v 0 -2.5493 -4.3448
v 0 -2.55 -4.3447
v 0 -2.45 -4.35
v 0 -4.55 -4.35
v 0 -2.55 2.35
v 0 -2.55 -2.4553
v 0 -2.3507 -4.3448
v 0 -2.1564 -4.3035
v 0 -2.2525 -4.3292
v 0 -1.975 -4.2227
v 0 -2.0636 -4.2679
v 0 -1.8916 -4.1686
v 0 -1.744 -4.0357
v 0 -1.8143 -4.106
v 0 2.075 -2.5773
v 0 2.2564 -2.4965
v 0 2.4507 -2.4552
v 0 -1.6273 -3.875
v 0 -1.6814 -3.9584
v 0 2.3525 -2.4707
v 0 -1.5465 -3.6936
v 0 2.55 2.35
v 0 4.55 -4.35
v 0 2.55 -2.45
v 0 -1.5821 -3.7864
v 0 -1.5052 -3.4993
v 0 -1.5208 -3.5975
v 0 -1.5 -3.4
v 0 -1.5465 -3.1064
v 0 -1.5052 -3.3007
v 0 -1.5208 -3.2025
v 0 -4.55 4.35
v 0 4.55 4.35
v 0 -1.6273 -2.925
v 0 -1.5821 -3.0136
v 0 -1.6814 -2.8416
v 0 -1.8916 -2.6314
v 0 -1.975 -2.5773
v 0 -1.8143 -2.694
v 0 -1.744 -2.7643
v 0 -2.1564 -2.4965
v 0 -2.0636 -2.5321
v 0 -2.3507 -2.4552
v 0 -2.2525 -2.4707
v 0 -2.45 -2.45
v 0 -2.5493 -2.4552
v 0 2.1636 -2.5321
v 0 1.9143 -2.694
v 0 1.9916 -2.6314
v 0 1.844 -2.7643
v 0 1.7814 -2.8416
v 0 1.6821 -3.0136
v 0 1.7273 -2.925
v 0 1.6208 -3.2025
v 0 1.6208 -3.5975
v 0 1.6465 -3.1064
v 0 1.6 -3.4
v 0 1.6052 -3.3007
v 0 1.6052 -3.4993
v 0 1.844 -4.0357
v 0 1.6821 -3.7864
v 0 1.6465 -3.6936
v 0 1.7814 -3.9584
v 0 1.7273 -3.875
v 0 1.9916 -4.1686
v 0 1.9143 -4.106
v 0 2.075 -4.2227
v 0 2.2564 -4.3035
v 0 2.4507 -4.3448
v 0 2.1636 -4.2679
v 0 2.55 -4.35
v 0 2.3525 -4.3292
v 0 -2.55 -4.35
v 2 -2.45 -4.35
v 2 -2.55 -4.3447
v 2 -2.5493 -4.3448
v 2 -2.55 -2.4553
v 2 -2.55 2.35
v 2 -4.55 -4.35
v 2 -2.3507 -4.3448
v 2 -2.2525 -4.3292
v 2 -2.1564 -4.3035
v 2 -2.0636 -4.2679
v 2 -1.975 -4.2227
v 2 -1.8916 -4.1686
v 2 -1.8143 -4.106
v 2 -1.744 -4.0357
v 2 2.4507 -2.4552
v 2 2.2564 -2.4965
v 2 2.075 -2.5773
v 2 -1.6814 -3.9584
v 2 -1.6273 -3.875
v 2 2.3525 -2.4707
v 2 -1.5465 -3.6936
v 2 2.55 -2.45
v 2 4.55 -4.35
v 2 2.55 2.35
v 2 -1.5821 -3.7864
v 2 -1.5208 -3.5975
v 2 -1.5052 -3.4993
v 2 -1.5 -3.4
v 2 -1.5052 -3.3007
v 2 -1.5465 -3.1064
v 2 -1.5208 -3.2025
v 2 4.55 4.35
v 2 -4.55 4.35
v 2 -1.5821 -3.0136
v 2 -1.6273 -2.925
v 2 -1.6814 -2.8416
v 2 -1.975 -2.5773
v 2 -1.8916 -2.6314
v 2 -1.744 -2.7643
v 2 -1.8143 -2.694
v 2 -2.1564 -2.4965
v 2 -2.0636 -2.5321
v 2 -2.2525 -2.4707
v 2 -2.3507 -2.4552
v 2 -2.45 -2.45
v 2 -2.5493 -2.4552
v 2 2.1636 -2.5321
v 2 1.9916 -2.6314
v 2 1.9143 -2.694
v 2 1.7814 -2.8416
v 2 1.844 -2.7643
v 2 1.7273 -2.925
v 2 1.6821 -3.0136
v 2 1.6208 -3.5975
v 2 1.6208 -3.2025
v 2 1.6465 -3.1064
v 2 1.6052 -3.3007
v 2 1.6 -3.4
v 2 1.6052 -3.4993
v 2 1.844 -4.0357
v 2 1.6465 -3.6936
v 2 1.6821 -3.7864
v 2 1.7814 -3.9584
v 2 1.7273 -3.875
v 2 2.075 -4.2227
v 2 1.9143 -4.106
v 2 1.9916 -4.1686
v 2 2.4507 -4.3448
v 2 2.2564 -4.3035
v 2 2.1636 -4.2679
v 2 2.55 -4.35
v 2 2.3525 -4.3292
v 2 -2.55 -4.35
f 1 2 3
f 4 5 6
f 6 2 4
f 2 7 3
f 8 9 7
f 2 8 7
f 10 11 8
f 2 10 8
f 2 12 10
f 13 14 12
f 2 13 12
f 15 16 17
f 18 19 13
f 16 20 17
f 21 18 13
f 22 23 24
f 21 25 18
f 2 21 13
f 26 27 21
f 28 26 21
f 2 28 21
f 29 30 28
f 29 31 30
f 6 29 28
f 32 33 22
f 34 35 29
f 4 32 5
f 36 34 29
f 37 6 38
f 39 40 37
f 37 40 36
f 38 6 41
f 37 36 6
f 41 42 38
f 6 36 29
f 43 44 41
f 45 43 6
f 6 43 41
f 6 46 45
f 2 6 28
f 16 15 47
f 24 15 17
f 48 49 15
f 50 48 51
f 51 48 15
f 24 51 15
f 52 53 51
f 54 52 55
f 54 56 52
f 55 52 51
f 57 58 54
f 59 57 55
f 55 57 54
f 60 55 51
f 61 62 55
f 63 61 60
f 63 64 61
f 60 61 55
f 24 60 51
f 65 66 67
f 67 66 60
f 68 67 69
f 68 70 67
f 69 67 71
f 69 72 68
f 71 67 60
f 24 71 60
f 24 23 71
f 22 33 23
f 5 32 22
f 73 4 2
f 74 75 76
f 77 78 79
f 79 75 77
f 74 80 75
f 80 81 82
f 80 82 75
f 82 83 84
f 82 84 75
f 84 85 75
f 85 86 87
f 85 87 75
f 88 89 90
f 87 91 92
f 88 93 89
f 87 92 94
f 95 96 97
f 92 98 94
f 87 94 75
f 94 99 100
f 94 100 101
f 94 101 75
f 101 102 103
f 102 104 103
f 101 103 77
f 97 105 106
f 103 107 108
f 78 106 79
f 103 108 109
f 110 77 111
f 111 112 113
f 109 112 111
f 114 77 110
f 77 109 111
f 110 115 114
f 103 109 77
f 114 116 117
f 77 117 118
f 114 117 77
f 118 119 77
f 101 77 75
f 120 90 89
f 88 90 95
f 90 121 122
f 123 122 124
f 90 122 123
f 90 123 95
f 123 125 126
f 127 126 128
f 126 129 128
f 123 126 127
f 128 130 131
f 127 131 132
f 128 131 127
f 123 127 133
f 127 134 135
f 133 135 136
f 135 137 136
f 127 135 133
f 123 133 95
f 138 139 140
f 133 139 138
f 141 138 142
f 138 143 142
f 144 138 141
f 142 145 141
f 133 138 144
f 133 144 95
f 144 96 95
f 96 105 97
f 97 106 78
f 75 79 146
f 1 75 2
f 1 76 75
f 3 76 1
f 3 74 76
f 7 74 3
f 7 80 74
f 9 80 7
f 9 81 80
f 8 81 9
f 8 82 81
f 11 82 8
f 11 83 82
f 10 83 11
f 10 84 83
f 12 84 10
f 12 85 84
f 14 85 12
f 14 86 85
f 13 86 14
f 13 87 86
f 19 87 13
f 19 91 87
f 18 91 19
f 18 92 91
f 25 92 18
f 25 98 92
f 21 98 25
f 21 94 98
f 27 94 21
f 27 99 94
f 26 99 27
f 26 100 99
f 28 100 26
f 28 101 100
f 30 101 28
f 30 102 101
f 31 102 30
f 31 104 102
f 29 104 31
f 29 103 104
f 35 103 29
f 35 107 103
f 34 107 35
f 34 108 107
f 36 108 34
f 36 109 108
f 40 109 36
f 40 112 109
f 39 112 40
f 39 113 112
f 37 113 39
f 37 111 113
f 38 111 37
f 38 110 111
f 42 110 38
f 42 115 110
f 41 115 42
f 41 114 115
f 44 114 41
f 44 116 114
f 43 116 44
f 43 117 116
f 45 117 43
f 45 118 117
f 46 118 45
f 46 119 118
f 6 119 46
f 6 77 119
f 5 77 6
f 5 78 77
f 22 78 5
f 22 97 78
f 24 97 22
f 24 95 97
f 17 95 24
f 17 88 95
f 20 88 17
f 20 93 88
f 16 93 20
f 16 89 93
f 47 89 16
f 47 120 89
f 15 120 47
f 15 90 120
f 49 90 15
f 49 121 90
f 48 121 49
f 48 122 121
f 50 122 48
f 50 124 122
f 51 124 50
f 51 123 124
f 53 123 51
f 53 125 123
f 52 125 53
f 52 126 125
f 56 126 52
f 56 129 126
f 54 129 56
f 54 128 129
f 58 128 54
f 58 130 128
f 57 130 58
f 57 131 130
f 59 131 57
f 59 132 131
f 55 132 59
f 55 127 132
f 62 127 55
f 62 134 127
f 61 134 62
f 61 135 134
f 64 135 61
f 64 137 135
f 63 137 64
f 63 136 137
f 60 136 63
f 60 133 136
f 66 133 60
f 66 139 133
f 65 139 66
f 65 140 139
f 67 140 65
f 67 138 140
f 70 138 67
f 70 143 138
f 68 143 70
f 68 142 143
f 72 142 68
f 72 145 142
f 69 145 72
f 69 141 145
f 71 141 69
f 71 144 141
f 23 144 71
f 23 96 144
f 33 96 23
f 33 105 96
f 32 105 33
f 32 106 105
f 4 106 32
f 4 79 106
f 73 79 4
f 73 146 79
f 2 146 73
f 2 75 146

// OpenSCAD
// axle_clip.scad - parametric rebuild of axle_clip.stl
// Reverse-engineered from the mesh: a flat plate with a bottom-open slot
// and two half-round detent bumps that snap over the axle.
// Matches the original STL placement: extruded along X from -10.5 to -8.5.

$fn = 60;

// ---- Parameters (mm) ----
plate_w   = 9.1;   // overall width  (Y)
plate_h   = 8.7;   // overall height (Z)
thick     = 2;     // thickness      (X)

slot_w    = 5.1;   // slot width (axle pocket)
slot_top  = 2.35;  // Z of slot ceiling (plate spans -4.35 .. +4.35)

bump_r    = 0.95;  // detent bump radius
bump_z    = -3.4;  // Z of bump centres (tangent to the open bottom edge)
bump_y_l  = -2.45; // Y of left bump centre  (NOTE: original is asymmetric:
bump_y_r  =  2.55; // Y of right bump centre  left is 0.1 mm inside the wall)
// snap-through gap between bumps = (bump_y_r - bump_r) - (bump_y_l + bump_r) = 3.1

x_start   = 0.0; // X position of the clip's back face (matches original STL)

module profile() {
    difference() {
        square([plate_w, plate_h], center = true);
        // slot, open at the bottom edge
        translate([-slot_w/2, -plate_h/2 - 1])
            square([slot_w, (slot_top + plate_h/2) + 1]);
    }
    // detent bumps; the part outside the slot overlaps solid plate, so no clipping needed
    for (y = [bump_y_l, bump_y_r]) translate([y, bump_z]) circle(r = bump_r);
}

// 2D (a,b) -> 3D (X = extrude, Y = a, Z = b)
translate([x_start, 0, 0])
    rotate([90, 0, 90])
        linear_extrude(height = thick)
            profile();
